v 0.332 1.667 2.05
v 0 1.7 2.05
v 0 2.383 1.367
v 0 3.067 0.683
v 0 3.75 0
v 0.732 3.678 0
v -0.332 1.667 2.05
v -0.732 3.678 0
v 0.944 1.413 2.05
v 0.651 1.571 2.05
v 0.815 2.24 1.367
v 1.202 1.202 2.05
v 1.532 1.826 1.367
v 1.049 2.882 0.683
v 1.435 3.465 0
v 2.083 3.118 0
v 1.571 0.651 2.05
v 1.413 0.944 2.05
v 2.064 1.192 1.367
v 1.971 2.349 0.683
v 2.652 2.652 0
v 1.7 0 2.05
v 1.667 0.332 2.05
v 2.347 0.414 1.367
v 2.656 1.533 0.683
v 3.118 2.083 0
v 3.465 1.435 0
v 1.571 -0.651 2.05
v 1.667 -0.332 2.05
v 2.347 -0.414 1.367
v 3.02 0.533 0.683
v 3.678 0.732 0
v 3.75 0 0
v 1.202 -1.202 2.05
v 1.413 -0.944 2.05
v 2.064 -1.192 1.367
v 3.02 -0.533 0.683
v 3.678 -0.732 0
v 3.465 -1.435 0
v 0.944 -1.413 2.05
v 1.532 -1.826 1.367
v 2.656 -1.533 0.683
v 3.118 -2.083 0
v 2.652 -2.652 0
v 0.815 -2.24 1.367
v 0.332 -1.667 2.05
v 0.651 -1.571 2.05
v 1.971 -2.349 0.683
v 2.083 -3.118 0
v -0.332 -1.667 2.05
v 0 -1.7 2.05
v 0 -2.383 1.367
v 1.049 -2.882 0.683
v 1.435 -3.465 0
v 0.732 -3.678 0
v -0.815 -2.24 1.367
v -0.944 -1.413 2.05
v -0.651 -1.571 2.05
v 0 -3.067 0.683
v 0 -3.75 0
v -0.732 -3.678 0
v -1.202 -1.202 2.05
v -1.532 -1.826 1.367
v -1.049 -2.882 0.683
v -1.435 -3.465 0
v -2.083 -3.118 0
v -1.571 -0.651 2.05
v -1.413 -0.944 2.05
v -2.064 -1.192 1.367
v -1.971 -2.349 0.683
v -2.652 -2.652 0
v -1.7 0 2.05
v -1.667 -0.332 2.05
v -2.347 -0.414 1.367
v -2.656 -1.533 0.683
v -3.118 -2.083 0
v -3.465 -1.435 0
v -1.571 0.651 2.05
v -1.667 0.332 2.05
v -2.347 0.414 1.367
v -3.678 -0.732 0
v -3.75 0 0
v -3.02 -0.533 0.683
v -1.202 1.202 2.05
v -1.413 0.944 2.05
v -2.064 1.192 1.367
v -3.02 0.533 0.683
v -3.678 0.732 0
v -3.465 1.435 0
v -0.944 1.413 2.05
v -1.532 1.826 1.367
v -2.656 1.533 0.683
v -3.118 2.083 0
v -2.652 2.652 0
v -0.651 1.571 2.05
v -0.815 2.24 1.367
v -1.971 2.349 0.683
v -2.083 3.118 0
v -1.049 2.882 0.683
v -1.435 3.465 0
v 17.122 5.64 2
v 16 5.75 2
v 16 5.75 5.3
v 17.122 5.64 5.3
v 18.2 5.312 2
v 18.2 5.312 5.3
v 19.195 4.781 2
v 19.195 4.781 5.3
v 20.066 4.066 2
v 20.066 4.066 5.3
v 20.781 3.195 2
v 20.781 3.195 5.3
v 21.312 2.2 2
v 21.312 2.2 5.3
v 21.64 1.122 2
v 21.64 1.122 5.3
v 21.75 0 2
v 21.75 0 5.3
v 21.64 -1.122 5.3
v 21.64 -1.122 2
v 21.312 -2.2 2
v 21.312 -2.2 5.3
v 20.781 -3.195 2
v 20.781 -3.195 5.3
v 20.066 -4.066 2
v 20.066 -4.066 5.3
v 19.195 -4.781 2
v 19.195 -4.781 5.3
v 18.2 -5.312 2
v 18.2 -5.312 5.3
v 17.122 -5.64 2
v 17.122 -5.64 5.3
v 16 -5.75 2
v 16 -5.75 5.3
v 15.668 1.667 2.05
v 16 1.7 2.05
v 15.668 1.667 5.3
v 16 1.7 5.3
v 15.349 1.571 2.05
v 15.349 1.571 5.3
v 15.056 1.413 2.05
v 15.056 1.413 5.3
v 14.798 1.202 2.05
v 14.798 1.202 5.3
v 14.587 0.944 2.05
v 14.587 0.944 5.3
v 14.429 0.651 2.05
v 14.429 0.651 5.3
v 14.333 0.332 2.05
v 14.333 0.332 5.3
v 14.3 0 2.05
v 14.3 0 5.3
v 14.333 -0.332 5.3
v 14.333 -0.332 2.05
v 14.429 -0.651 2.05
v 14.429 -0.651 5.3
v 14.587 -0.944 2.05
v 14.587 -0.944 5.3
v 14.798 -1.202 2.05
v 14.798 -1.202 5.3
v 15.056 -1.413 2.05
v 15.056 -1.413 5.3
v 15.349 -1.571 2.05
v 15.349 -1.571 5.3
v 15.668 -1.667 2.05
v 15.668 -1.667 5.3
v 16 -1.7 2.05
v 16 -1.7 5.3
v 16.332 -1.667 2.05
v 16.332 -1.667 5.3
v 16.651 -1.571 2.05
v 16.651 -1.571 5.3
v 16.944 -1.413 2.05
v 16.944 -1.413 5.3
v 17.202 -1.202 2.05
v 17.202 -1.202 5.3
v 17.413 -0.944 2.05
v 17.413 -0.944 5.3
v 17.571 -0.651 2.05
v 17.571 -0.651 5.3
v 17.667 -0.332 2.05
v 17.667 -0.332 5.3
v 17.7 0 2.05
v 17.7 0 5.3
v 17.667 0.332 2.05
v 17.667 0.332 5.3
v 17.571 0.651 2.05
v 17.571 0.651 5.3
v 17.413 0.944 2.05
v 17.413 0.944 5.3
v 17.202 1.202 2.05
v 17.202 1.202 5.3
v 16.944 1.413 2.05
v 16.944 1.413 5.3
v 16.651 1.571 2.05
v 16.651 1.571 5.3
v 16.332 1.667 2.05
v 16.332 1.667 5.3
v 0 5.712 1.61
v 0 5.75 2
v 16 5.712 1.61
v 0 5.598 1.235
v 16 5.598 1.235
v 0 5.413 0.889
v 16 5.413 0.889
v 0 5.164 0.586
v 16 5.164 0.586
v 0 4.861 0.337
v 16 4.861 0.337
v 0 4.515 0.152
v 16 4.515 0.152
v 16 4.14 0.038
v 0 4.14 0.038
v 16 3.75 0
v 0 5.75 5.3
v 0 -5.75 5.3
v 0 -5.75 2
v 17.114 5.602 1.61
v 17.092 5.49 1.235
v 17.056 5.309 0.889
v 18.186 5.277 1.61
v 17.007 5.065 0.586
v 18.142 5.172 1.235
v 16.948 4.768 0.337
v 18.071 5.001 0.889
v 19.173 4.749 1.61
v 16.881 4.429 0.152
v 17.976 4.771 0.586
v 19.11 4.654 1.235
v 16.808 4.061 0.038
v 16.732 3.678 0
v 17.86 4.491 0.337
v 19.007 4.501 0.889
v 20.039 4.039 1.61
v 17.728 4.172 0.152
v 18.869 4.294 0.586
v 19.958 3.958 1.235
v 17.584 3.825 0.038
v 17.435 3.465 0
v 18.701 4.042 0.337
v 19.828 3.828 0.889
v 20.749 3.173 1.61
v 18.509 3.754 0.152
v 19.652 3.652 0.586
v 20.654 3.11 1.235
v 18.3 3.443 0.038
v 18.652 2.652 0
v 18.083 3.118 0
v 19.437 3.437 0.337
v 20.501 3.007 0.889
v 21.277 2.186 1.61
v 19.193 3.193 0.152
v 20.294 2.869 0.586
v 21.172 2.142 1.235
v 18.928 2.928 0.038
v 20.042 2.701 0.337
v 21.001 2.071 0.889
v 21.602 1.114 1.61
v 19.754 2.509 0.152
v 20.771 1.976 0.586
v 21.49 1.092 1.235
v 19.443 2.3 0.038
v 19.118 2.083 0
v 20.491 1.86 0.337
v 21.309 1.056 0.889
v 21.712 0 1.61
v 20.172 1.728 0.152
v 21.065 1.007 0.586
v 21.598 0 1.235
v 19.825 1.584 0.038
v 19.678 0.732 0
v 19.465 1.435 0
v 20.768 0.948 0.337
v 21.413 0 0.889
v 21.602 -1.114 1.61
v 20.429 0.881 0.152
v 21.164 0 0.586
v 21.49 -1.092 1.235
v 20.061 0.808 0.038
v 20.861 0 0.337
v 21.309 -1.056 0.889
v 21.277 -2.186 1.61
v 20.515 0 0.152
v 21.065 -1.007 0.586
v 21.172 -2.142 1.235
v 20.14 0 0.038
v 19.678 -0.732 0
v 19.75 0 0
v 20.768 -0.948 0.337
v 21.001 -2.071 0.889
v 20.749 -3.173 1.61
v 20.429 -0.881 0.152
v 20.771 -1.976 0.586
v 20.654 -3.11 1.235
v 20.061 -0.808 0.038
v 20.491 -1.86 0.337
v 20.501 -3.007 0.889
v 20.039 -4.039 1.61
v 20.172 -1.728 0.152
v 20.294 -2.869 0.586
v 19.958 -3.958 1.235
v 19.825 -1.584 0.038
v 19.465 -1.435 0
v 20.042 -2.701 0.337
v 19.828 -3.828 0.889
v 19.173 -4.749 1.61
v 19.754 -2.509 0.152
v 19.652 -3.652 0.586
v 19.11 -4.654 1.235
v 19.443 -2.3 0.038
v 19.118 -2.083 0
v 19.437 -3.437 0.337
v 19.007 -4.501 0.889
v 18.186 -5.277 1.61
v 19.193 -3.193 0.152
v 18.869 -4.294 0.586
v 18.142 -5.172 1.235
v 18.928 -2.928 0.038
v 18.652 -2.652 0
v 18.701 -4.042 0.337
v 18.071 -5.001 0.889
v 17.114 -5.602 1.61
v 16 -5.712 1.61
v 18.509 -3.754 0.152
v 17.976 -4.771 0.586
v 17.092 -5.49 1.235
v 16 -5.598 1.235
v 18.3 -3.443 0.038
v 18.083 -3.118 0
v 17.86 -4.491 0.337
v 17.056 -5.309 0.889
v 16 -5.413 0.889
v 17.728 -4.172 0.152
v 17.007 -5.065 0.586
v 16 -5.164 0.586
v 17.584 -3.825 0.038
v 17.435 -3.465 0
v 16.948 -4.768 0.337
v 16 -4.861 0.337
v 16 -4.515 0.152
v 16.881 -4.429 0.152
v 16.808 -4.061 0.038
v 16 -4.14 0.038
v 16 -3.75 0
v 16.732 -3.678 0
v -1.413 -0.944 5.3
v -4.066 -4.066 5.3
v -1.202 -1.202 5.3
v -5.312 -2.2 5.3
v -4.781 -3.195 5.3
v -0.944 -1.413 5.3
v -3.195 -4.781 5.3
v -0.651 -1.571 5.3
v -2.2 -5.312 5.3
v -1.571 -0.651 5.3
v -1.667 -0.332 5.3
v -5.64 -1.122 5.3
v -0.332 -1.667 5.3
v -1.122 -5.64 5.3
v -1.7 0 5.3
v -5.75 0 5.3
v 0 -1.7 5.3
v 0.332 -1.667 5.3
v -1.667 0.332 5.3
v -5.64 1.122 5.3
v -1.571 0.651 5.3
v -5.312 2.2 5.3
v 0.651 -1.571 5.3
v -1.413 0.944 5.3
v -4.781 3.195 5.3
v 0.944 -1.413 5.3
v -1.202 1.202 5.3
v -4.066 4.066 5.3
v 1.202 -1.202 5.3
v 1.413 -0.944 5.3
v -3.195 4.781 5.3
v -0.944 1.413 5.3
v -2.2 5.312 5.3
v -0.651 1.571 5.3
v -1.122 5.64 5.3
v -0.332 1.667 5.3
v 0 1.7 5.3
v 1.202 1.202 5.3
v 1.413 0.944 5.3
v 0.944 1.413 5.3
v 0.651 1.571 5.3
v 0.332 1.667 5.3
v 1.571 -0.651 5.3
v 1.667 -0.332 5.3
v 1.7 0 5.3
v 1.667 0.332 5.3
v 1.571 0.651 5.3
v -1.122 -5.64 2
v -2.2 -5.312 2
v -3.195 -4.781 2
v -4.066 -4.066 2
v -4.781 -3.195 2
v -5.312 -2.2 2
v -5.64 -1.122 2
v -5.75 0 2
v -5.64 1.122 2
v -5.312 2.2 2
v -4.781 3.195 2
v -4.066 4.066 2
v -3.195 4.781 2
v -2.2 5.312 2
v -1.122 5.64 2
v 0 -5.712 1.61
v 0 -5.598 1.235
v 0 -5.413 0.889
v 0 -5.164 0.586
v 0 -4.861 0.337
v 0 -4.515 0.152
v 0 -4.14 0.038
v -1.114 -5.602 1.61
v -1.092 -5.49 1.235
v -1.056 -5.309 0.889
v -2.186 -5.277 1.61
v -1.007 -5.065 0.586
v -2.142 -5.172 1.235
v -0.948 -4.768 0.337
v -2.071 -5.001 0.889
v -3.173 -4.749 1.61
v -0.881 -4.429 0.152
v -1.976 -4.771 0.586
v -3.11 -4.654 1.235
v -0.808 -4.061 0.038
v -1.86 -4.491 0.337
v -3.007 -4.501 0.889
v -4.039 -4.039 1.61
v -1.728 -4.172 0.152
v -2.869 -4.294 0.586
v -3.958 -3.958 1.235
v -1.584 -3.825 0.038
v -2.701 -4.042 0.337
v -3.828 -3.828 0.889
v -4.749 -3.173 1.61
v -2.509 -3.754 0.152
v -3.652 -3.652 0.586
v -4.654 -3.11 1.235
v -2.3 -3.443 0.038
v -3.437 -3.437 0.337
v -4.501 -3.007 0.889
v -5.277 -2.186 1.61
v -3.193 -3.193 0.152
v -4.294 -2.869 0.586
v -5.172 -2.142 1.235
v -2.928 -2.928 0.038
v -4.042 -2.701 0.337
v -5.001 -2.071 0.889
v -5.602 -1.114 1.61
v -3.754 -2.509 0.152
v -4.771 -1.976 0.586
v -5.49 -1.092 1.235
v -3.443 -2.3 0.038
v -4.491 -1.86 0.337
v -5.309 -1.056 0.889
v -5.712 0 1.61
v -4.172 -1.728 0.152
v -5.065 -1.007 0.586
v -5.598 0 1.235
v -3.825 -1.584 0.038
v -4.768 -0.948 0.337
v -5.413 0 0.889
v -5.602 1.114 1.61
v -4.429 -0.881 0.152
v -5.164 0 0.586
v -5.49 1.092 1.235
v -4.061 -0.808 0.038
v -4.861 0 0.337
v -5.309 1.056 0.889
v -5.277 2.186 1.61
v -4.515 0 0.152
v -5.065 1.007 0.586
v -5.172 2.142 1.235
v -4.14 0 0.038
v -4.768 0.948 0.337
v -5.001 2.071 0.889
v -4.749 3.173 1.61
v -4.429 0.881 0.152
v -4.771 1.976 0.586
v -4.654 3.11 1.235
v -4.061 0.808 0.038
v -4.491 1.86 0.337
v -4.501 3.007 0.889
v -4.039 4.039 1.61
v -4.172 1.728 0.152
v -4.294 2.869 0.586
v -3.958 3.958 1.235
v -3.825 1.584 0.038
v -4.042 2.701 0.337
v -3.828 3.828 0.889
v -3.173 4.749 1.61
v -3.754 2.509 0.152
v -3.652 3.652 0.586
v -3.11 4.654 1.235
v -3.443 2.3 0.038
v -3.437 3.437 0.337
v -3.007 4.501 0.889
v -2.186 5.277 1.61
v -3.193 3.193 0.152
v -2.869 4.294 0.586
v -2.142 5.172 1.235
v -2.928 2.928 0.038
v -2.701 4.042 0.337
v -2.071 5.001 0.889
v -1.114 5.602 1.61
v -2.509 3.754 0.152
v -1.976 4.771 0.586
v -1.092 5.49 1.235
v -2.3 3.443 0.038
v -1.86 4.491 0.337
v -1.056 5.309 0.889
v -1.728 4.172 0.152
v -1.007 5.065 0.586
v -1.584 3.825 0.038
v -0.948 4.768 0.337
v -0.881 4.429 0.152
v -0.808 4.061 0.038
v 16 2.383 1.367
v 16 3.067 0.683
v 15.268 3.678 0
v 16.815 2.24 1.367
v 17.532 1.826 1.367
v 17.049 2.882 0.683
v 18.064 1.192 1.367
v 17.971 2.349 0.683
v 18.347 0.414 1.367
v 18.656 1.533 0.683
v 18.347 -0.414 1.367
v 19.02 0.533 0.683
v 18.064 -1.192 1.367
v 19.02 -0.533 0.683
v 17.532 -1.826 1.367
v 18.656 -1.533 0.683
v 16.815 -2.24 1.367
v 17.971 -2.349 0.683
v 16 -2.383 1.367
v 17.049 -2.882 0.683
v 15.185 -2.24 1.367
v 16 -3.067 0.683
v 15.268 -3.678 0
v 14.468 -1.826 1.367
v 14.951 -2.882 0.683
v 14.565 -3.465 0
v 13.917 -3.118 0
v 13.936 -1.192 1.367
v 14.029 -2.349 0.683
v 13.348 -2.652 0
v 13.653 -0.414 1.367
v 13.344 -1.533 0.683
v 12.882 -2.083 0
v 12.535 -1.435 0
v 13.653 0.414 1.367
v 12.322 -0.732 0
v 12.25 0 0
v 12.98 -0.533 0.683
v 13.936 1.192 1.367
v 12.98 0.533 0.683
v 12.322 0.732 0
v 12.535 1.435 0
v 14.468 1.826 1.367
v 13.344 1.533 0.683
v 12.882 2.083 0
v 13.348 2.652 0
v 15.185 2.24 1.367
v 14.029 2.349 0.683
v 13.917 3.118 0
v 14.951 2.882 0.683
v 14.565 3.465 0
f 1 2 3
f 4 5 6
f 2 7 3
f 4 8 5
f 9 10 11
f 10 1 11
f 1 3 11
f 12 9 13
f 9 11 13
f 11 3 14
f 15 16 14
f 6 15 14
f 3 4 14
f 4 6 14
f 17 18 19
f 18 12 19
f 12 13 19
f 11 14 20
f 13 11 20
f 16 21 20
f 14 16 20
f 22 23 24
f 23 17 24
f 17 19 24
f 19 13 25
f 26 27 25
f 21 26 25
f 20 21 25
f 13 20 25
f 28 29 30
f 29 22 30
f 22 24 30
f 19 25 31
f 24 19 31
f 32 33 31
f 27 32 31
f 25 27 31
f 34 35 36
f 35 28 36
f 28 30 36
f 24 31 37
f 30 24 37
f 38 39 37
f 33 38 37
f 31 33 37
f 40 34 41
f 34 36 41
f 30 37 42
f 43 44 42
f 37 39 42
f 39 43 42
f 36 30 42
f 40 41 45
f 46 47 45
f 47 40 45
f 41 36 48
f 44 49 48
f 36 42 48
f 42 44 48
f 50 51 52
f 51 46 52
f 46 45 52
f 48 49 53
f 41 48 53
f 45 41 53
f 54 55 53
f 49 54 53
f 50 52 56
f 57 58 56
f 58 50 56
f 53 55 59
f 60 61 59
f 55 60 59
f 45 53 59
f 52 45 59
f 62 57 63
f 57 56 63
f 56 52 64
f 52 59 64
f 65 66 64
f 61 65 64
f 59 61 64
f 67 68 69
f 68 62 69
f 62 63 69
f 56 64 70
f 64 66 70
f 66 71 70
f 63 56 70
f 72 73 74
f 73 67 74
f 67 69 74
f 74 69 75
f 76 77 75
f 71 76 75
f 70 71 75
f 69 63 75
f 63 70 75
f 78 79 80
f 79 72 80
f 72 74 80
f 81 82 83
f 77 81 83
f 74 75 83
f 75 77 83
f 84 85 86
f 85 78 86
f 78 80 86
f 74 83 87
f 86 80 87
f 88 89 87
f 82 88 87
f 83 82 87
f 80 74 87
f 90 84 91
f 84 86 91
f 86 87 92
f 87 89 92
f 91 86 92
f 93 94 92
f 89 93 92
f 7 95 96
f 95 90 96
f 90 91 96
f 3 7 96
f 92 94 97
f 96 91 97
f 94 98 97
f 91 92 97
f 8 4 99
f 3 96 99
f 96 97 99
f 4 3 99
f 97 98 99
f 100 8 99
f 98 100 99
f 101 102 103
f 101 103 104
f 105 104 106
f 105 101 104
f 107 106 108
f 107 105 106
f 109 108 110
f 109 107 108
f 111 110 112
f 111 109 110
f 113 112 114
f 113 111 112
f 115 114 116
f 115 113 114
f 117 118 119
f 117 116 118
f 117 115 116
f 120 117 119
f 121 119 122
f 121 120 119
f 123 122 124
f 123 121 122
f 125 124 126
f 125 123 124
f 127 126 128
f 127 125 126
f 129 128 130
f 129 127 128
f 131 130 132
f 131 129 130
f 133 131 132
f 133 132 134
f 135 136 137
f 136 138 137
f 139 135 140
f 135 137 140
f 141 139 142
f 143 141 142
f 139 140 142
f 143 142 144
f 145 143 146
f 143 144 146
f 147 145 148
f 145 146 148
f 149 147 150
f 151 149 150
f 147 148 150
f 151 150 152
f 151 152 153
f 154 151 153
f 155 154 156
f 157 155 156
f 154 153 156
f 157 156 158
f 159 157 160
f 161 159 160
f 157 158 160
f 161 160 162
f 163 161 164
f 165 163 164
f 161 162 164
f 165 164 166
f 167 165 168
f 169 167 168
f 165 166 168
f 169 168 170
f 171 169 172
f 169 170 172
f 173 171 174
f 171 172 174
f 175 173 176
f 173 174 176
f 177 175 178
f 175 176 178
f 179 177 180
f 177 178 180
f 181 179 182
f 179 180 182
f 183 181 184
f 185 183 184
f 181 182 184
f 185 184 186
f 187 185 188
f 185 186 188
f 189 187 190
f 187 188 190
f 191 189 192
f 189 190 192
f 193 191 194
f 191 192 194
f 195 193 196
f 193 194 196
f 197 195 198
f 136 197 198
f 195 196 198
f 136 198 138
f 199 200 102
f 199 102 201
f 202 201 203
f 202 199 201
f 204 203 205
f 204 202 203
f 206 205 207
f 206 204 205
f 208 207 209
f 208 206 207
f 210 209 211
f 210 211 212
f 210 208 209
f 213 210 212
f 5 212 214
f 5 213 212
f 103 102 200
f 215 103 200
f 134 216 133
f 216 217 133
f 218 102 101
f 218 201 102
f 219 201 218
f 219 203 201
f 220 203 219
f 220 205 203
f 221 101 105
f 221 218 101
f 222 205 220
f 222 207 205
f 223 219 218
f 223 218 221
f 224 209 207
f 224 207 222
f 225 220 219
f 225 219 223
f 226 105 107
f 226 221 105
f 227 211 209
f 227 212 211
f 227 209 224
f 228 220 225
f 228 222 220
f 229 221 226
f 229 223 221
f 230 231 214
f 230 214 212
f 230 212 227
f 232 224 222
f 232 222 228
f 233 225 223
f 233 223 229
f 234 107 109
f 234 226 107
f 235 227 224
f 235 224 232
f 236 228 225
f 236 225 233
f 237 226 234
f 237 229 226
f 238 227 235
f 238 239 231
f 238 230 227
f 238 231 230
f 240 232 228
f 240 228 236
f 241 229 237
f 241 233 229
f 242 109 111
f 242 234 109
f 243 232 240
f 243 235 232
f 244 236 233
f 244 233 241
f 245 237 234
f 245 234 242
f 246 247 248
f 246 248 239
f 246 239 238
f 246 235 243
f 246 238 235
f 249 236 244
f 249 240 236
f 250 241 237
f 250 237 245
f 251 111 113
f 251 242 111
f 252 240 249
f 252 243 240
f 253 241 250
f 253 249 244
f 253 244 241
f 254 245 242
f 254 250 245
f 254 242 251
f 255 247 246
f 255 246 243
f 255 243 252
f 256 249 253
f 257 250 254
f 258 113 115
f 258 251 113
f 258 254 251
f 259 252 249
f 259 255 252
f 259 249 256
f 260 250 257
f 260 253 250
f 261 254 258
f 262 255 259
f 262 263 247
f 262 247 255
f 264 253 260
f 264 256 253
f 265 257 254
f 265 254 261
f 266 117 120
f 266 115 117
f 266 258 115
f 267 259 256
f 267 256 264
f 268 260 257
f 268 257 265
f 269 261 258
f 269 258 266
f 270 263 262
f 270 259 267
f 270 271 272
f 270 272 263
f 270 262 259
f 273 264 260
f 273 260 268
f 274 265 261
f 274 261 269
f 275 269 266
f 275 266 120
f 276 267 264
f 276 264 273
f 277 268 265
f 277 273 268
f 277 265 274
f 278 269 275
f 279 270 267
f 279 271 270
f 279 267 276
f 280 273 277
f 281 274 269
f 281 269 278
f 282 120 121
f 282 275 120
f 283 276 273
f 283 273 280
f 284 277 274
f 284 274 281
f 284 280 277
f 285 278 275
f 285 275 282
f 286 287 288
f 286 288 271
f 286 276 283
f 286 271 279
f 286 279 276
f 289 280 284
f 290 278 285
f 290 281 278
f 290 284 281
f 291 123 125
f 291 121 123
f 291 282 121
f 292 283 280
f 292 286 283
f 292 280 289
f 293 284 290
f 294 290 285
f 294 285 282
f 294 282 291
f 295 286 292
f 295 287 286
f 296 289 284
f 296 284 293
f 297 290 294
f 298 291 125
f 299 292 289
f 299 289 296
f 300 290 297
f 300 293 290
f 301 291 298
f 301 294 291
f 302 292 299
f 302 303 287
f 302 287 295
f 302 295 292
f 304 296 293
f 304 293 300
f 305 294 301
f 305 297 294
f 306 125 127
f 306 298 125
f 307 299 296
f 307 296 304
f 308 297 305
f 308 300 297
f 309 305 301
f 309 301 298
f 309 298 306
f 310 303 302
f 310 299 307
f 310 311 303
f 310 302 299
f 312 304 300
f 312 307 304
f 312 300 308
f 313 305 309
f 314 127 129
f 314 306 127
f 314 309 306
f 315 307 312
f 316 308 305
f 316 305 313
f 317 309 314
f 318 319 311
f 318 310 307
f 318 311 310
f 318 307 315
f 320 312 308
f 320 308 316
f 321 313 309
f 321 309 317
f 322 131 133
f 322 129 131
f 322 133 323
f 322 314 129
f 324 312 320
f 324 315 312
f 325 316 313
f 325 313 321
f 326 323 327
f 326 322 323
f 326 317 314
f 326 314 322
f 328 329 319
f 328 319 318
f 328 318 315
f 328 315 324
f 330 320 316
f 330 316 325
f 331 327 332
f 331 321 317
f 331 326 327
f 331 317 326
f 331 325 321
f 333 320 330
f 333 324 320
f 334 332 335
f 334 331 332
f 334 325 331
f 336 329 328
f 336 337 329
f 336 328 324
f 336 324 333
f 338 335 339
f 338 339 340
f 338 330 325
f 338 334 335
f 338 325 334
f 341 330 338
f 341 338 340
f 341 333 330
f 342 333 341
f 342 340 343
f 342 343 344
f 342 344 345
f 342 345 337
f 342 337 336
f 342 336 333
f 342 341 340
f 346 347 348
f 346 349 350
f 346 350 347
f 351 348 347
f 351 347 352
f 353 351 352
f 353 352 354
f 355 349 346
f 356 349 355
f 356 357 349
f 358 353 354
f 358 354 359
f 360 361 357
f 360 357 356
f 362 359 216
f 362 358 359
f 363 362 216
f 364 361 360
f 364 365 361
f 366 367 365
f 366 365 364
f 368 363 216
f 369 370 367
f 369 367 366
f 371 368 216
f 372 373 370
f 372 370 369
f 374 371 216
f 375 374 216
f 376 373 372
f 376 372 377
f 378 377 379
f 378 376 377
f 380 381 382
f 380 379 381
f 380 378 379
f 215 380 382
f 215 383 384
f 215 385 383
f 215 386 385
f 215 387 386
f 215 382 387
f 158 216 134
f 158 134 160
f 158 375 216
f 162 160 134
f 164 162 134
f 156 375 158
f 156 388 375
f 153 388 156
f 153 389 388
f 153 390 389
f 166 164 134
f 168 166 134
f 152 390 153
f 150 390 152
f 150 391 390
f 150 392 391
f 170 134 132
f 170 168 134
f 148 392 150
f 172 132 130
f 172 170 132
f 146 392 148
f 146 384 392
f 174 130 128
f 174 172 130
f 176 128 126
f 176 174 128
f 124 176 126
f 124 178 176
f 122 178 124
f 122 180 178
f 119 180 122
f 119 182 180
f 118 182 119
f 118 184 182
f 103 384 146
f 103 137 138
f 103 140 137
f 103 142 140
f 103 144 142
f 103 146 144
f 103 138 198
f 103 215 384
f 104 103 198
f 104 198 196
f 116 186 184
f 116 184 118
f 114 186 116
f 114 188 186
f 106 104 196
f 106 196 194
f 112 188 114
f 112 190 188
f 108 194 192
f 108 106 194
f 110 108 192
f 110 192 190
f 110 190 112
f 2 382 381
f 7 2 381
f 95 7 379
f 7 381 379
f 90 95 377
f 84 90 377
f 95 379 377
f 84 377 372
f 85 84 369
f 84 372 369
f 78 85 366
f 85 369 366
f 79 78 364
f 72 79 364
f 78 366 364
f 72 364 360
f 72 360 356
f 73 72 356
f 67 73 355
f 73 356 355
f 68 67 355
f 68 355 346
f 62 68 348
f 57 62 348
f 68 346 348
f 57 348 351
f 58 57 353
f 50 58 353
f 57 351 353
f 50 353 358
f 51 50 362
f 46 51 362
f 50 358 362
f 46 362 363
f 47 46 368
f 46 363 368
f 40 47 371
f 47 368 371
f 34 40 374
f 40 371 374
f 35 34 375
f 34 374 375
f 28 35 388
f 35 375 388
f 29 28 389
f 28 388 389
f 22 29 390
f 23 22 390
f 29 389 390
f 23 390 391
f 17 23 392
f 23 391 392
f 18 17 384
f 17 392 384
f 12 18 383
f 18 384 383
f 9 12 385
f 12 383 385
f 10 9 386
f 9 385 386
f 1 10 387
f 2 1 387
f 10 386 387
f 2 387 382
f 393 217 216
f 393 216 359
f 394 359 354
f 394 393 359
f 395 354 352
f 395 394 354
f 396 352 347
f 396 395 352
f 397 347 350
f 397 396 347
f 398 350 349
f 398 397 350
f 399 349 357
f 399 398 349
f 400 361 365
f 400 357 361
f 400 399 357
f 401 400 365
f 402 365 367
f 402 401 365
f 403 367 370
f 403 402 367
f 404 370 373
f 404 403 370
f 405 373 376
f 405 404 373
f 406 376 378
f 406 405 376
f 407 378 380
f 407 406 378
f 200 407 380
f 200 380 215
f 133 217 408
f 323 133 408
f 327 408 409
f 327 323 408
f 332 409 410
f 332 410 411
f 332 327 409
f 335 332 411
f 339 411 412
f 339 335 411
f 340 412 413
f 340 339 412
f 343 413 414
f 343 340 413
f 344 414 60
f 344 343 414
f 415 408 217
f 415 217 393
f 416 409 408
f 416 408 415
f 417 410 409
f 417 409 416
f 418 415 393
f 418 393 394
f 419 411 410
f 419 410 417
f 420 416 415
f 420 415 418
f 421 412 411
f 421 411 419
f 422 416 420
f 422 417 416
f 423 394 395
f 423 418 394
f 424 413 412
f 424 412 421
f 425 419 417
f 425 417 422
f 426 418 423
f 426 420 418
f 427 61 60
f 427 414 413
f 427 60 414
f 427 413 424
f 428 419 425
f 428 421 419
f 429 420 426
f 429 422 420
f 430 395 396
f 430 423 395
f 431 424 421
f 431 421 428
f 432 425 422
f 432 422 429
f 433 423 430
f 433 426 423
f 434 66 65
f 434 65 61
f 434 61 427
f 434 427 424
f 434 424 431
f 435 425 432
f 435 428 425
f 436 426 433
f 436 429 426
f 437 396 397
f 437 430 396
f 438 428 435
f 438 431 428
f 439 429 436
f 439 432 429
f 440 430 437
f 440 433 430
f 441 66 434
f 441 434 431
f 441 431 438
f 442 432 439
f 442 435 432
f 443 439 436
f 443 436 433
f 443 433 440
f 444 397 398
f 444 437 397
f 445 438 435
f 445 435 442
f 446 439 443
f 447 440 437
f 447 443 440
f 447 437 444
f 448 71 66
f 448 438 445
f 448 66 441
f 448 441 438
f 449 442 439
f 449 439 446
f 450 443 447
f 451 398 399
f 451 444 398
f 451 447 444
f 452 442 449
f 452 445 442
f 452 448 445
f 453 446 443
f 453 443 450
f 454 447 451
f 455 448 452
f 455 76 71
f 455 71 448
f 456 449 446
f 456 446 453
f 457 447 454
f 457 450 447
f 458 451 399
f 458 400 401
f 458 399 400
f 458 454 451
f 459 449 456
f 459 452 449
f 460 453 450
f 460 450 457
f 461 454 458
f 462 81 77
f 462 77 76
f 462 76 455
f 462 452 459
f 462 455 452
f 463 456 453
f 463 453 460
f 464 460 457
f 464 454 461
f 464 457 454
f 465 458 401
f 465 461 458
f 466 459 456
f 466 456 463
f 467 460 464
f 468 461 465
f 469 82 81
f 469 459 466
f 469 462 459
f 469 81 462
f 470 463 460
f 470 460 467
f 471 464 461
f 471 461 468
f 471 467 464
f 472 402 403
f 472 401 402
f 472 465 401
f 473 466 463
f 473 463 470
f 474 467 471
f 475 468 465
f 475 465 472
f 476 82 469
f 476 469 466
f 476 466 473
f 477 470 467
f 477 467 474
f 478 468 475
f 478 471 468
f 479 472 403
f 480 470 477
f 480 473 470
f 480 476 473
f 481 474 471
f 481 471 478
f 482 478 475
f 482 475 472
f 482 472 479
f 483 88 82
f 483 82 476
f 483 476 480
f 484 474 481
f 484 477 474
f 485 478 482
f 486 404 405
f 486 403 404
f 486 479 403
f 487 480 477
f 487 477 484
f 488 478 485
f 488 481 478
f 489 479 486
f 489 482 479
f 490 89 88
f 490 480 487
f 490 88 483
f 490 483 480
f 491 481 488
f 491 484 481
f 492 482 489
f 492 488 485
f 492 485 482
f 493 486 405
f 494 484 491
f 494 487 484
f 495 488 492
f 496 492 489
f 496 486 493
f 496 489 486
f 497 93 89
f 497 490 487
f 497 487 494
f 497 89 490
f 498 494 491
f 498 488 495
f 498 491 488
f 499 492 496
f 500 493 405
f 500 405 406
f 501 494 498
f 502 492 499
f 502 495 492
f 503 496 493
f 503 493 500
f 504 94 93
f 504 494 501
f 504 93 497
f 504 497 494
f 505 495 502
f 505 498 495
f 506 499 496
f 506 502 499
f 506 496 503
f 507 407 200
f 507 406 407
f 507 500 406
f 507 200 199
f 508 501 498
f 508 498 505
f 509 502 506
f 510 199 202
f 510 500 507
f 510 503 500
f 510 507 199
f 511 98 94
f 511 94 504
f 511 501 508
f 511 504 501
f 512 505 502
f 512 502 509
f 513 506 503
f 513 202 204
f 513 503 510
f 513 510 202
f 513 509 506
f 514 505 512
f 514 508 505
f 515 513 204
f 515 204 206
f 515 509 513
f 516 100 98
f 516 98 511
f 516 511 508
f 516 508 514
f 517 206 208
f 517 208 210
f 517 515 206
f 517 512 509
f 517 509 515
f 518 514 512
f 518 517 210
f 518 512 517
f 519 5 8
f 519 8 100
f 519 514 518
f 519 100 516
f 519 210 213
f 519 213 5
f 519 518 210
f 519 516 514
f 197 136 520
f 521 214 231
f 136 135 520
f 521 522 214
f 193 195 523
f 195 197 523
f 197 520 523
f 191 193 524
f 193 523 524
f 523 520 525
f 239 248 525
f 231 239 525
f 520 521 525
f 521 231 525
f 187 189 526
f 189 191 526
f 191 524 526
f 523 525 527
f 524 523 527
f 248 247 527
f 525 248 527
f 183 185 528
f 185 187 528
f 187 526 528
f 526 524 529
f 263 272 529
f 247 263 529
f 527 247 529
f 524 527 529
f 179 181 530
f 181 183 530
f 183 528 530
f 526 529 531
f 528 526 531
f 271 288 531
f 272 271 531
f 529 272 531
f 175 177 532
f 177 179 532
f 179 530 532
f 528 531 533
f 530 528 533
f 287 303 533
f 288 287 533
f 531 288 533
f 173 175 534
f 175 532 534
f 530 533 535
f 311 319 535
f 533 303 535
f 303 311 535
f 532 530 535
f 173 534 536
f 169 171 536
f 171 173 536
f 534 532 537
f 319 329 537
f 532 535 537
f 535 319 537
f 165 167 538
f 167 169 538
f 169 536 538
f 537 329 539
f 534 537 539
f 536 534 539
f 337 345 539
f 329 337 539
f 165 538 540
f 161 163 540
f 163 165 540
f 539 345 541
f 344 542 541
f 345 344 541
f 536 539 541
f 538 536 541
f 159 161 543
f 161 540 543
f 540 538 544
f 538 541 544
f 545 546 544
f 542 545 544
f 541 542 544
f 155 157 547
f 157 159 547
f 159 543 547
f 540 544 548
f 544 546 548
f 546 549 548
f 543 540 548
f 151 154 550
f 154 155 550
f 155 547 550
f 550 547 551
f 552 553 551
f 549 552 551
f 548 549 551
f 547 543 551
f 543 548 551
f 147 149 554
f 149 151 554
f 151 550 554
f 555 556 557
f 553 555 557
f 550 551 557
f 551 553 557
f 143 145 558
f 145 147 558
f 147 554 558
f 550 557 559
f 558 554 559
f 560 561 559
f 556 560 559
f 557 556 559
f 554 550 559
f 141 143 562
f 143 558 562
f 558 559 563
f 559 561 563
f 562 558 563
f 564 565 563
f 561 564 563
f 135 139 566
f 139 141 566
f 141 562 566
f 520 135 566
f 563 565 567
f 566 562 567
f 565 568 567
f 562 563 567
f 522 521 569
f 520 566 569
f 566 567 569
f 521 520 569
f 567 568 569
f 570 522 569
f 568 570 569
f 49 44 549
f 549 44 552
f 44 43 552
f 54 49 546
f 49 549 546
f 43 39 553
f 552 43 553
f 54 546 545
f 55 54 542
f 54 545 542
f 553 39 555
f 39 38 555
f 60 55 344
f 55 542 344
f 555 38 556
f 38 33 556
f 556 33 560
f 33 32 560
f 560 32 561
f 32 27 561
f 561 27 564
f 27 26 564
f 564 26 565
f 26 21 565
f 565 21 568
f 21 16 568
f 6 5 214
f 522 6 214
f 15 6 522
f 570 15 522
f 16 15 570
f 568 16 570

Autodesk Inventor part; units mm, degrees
ref_plane "YZ Plane" through (0, 0, 0) normal (1, 0, 0) x (0, 1, 0)
ref_plane "XZ Plane" through (0, 0, 0) normal (0, 1, 0) x (-1, 0, 0)
ref_plane "XY Plane" through (0, 0, 0) normal (0, 0, 1) x (1, 0, 0)
sketch "Skizze1" plane through (0, 0, 0) normal (0, 0, 1) x (1, 0, 0)
  line L0 (0, 0) -> (16, 0) construction
  line L1 (0, -5.75) -> (16, -5.75)
  line L2 (16, 5.75) -> (0, 5.75)
  arc A0 (0, 5.75) -> (0, -5.75) centre (0, 0) ccw
  arc A1 (16, -5.75) -> (16, 5.75) centre (16, 0) ccw
  point P0 (8, 0)
  dimension "d0" = 16
  dimension "d1" = 11.5
extrude "Extrusion1" add sketch "Skizze1" along normal blind 5.3
hole "Bohrung1" at (0, 0, 0) at (16, 0, 0) direction (0, 0, 1) diameter 3.4 end through all countersink diameter 7.5 countersink angle 90 clearance for "Innensechskant-Senkkopfschraube DIN EN ISO 10642" size "M3" standard "DIN"
fillet "Rundung1" radius 2 4 edges at (-5.75, 0, 0) (8, -5.75, 0) (21.75, 0, 0) (8, 5.75, 0)
properties part number "Connector_TopPlate"
